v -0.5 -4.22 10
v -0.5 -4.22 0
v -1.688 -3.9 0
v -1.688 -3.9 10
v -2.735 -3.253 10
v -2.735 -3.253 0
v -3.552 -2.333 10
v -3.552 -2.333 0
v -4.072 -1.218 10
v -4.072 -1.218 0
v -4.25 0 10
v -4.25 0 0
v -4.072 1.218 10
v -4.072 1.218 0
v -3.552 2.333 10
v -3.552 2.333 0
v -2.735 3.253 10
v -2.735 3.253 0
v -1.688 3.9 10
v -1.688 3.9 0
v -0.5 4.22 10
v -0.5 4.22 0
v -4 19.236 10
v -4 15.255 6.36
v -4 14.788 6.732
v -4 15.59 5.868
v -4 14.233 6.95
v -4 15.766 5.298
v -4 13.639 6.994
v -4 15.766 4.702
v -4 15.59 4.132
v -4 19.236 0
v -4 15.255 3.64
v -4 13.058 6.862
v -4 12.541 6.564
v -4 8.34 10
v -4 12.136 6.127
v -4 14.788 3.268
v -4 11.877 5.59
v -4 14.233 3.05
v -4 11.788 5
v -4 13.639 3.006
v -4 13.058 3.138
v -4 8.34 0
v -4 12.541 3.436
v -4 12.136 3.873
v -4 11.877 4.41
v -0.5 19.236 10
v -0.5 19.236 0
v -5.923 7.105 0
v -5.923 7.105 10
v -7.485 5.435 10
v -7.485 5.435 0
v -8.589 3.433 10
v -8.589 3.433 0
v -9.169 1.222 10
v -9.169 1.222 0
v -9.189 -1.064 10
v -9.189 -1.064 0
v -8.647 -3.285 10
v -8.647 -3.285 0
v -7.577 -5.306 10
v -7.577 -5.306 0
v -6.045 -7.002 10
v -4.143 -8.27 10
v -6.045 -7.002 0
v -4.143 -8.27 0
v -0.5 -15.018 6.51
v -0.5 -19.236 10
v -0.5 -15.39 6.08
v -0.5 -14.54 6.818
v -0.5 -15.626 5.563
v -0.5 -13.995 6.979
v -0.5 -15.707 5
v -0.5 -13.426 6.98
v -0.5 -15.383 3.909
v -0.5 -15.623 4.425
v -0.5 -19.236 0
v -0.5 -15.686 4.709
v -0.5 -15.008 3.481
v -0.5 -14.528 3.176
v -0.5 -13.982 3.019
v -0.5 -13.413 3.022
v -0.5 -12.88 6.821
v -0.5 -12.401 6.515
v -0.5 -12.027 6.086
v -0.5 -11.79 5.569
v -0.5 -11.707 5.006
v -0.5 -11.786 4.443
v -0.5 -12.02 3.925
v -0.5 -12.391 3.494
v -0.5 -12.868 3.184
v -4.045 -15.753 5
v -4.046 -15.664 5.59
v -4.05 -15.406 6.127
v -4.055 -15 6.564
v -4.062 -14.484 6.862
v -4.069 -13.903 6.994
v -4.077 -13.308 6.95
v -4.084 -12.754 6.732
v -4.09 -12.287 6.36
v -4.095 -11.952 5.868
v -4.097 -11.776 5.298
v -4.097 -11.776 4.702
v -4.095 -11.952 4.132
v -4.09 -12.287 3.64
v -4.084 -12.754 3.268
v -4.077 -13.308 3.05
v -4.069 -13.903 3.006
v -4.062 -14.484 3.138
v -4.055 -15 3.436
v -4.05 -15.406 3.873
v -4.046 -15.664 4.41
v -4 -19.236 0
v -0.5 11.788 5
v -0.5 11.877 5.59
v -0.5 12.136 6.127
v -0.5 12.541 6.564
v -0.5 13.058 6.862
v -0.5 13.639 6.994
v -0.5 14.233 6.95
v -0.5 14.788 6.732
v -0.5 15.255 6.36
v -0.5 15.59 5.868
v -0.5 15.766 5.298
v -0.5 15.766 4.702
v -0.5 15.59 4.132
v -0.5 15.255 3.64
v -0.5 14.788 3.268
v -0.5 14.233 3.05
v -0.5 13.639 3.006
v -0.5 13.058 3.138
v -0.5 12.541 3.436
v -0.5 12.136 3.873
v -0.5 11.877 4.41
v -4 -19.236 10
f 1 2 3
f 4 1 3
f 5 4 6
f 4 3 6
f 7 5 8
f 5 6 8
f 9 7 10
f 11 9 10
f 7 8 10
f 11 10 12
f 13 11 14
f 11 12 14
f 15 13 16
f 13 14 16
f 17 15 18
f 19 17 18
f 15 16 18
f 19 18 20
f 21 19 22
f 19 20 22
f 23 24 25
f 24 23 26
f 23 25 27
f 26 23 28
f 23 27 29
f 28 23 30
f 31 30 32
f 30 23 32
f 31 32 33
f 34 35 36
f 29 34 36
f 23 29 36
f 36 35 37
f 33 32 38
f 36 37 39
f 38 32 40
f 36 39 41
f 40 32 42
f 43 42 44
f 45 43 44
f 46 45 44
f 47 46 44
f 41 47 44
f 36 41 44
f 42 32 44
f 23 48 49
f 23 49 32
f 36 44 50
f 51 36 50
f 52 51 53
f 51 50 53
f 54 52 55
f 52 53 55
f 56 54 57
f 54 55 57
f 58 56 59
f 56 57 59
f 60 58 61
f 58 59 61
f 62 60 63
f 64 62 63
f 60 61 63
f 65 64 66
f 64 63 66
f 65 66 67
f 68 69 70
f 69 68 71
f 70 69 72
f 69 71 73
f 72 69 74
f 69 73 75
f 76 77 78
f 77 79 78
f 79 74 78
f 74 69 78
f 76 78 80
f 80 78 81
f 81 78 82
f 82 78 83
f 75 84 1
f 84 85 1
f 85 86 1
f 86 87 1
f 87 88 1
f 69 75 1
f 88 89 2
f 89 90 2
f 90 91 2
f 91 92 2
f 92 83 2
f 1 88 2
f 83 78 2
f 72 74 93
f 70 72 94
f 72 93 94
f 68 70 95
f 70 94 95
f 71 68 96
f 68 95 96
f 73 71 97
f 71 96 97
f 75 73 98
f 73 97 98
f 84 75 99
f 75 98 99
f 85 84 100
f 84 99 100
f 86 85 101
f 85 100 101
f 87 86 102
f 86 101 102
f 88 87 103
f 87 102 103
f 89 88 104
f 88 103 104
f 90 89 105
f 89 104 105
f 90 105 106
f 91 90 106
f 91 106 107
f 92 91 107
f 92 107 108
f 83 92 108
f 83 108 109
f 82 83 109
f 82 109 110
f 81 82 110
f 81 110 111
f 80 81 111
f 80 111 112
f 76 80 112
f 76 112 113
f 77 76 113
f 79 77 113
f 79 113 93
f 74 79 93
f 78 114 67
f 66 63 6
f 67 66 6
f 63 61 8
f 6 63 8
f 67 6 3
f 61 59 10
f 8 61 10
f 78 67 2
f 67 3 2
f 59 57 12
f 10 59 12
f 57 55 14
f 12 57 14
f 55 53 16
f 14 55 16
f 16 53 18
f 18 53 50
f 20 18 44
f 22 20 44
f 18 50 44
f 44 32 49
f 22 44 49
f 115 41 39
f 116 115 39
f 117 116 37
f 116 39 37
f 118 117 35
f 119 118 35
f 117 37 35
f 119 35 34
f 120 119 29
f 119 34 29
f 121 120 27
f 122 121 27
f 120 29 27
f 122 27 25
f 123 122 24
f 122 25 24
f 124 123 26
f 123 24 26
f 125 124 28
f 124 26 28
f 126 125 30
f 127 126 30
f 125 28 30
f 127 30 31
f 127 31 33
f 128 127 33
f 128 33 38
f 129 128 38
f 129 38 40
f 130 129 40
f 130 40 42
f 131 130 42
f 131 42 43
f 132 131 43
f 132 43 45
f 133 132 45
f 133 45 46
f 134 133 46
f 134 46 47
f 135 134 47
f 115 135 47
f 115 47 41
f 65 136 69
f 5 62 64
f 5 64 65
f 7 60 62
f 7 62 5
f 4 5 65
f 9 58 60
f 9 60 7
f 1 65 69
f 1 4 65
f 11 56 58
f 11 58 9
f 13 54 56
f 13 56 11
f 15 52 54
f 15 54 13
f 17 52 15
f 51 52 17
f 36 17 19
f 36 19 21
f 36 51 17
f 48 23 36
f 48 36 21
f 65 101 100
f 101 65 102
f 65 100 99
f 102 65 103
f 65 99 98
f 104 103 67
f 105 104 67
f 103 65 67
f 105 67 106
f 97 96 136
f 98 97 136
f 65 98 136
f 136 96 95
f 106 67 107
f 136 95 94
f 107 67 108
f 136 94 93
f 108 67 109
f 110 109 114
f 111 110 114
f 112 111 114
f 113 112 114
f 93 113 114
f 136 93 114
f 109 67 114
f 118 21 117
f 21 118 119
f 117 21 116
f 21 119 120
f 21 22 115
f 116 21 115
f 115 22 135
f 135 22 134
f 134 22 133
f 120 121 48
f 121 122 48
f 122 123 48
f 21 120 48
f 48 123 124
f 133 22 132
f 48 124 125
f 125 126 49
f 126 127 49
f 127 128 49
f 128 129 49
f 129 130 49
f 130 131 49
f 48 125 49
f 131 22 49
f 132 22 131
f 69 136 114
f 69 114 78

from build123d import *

# Parameters (mm, degrees)
F1_DEPTH = 10
F2_R     = 2
F3_DEPTH = 25
F4_R     = 2
F5_DEPTH = 25


with BuildPart() as f1:
    # F0 (on Top) → F1 (new body)
    with BuildSketch(Plane.XY):
        with BuildLine():
            ThreePointArc((-0.5, -4.220485754), (-4.25, 0), (-0.5, 4.220485754))
            Line((-0.5, 4.220485754), (-0.5, 9.236476601))
            Line((-0.5, 9.236476601), (-0.5, 19.236476601))
            Line((-0.5, 19.236476601), (-4, 19.236476601))
            Line((-4, 19.236476601), (-4, 8.3404136588))
            ThreePointArc((-4, 8.3404136588), (-9.2496585868, 0.0794734394), (-4.1427212192, -8.2704510699))
            Line((-4.1427212192, -8.2704510699), (-4, -19.236476601))
            Line((-4, -19.236476601), (-0.5, -19.236476601))
            Line((-0.5, -19.236476601), (-0.5, -9.236476601))
            Line((-0.5, -9.236476601), (-0.5, -4.220485754))
        make_face()
    extrude(amount=F1_DEPTH)

    # F2 (on face) → F3 (cut)
    with BuildSketch(Plane(origin=(-4, 0, 0), x_dir=(0, -1, 0), z_dir=(-1, 0, 0))):
        with Locations((-13.7884451299, 5)):
            Circle(F2_R)
    extrude(amount=-F3_DEPTH, mode=Mode.SUBTRACT)

    # F4 (on face) → F5 (cut)
    with BuildSketch(Plane(origin=(-4.2496400996, -0.0553084447, 0), x_dir=(0.0130137517, -0.9999153175, 0), z_dir=(-0.9999153175, -0.0130137517, 0))):
        with Locations((13.6993154824, 5)):
            Circle(F4_R)
    extrude(amount=-F5_DEPTH, mode=Mode.SUBTRACT)


solid = f1.part
